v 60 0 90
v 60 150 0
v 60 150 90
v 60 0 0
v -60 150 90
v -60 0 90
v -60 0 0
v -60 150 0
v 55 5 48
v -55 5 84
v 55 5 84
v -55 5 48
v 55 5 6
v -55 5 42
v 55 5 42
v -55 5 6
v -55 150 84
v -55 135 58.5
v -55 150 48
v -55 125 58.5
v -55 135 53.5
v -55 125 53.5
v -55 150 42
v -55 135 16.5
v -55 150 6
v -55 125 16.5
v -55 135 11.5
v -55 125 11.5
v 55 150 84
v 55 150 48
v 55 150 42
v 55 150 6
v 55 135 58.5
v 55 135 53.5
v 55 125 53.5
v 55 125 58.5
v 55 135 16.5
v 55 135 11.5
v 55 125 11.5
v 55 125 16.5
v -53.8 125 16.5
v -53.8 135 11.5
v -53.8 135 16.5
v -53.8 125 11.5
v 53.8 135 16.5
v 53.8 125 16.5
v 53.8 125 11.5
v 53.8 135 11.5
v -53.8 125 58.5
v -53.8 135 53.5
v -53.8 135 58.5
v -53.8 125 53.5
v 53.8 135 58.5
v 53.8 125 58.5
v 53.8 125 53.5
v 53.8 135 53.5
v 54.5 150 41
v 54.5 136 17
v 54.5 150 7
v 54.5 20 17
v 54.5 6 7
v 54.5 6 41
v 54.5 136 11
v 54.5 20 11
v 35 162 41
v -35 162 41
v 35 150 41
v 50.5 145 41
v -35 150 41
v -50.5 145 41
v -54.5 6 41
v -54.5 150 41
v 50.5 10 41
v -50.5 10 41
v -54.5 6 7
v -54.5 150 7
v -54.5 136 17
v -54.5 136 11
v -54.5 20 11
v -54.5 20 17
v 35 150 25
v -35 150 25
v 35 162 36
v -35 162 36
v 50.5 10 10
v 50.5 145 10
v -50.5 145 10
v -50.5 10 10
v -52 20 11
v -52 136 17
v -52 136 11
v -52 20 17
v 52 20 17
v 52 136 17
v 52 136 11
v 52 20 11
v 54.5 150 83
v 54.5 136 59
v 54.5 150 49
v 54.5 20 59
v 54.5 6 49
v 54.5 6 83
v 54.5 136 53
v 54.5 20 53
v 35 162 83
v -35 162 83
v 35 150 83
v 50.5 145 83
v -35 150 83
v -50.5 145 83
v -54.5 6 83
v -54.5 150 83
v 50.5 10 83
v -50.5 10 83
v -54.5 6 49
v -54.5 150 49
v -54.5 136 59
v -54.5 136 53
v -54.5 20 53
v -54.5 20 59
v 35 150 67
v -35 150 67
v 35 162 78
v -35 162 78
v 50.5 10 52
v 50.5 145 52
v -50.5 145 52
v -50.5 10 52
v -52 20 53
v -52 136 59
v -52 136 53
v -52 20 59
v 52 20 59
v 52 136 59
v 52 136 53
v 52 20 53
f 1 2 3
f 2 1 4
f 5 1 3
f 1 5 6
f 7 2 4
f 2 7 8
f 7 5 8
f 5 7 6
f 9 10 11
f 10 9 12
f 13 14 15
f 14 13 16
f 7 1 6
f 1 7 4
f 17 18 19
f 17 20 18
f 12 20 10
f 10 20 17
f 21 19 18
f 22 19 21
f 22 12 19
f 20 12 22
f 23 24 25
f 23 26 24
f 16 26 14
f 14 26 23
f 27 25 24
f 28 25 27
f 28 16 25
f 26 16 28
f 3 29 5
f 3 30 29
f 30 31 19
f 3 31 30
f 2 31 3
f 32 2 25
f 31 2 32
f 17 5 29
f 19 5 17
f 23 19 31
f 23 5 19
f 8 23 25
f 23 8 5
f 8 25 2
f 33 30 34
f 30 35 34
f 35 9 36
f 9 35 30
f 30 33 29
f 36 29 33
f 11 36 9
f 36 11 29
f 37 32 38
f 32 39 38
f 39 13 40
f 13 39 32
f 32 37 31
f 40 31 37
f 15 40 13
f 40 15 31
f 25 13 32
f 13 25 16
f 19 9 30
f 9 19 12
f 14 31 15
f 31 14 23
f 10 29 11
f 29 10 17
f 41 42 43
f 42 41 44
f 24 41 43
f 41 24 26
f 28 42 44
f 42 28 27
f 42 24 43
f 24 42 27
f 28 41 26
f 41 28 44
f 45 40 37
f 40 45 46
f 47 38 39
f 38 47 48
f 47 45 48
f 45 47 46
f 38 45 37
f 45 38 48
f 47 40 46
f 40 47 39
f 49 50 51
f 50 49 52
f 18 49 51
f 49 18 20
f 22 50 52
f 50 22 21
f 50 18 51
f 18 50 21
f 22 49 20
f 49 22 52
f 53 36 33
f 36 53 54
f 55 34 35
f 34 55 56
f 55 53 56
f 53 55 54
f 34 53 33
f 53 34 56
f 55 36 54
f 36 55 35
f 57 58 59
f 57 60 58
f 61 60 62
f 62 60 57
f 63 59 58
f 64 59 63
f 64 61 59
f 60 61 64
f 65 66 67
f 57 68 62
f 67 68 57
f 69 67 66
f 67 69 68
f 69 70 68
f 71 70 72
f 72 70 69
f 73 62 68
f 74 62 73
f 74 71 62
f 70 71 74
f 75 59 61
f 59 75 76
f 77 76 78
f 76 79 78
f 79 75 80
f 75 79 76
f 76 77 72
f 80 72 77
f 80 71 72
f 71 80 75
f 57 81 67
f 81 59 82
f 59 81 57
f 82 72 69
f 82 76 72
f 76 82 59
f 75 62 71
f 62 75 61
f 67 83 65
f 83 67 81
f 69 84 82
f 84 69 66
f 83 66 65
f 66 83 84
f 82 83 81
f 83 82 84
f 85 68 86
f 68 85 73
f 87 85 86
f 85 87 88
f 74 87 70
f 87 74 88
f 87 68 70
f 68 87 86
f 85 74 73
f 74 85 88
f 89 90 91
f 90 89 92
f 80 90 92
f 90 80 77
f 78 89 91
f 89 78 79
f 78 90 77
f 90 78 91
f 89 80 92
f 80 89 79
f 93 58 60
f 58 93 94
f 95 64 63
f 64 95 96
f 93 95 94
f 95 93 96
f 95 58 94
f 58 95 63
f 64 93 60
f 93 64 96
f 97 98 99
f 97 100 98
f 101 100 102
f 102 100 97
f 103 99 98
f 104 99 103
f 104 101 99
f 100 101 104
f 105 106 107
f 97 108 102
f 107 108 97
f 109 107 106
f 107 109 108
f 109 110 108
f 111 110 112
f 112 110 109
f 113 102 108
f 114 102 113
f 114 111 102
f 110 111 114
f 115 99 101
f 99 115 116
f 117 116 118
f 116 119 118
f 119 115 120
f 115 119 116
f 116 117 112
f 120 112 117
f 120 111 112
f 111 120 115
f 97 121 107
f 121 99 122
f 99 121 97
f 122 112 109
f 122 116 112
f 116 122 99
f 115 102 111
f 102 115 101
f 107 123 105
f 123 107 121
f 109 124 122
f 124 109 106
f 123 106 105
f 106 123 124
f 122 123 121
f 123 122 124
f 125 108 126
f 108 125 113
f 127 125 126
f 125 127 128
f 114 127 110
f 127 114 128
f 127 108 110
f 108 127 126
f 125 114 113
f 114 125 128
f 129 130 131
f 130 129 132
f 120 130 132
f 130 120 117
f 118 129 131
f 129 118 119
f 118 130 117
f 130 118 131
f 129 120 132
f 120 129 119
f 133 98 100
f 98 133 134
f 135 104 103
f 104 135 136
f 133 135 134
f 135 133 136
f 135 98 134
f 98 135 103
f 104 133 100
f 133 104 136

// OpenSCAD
part = "assembly"; // [assembly:Assembly, frame:Frame, drawer:Drawer]
cadverify_only = "";
module instance(name, part, unit = 1) {
    echo(cadverify_instance = [name, part, unit]);
    if (cadverify_only == "" || cadverify_only == name) children();
}
// frame assembly coords: X -60..60, Y 0..150, Z 0..90
module frame_asm() {
    union() {
        translate([-60,0,0]) cube([120,5,90]);
        translate([-60,0,0]) cube([5,150,90]);
        translate([55,0,0]) cube([5,150,90]);
        translate([-55,5,0]) cube([110,145,6]);
        translate([-55,5,42]) cube([110,145,6]);
        translate([-55,5,84]) cube([110,145,6]);
        translate([-55,125,11.5]) cube([1.2,10,5]);
        translate([53.8,125,11.5]) cube([1.2,10,5]);
        translate([-55,125,53.5]) cube([1.2,10,5]);
        translate([53.8,125,53.5]) cube([1.2,10,5]);
    }
}
module frame_print() {
    translate([0,90,0]) rotate([90,0,0]) frame_asm();
}
// drawer part coords: X -54.5..54.5, Y 0..144 body + handle to 156, Z 0..34
module drawer_raw() {
    difference() {
        union() {
            translate([-54.5,0,0]) cube([109,144,34]);
            // handle wedge (solid triangular prism via hull) + tip block, overlapped for manifold union
            hull() {
                translate([-35,143,18]) cube([70,1,1]);
                translate([-35,143,29]) cube([70,1,1]);
                translate([-35,155,29]) cube([70,1,1]);
            }
            translate([-35,143,29]) cube([70,13,5]);
        }
        translate([-50.5,4,3]) cube([101,135,32]);
        translate([-54.5,14,4]) cube([2.5,116,6]);
        translate([52,14,4]) cube([2.5,116,6]);
    }
}
module drawer_part() { drawer_raw(); }
module frame_spec() {
    echo(cadverify_spec = [
        ["bounds", [[-60,0,0],[60,90,150]]],
        ["bodies", 1],
        ["through_holes", 0],
        ["support_faces", [["bed","-z",5000]]],
        ["overhangs_allowed", [
            ["stop tab underside, bridge 2.4mm", [[-55,74.5,124],[-53.8,79.5,126]]],
            ["stop tab underside, bridge 2.4mm", [[53.8,74.5,124],[55,79.5,126]]],
            ["stop tab underside, bridge 2.4mm", [[-55,32.5,124],[-53.8,37.5,126]]],
            ["stop tab underside, bridge 2.4mm", [[53.8,32.5,124],[55,37.5,126]]]
        ]],
        ["copies", 1],
        ["details", [
            ["back_panel","material",[[-60,0,0],[60,90,5]],0.9],
            ["stop_tab_ll","material",[[-55,74.5,125],[-53.8,79.5,135]],0.9],
            ["stop_tab_lr","material",[[53.8,74.5,125],[55,79.5,135]],0.9],
            ["stop_tab_ul","material",[[-55,32.5,125],[-53.8,37.5,135]],0.9],
            ["stop_tab_ur","material",[[53.8,32.5,125],[55,37.5,135]],0.9],
            ["lower_cavity","void",[[-55,48,5],[55,84,150]],0.9],
            ["upper_cavity","void",[[-55,6,5],[55,42,150]],0.9],
            ["back","thickness",[0,10,-1],[0,0,1],5]
        ]]
    ]);
}
module drawer_spec() {
    echo(cadverify_spec = [
        ["bounds", [[-54.5,0,0],[54.5,156,34]]],
        ["bodies", 1],
        ["through_holes", 0],
        ["support_faces", [["bed","-z",10000]]],
        ["overhangs_allowed", [
            ["drawer slide groove ceiling, bridge 5mm", [[-54.5,14,9],[-52,130,11]]],
            ["drawer slide groove ceiling, bridge 5mm", [[52,14,9],[54.5,130,11]]]
        ]],
        ["copies", 2],
        ["details", [
            ["pull_tip","material",[[-35,150,30],[35,156,34]],0.9],
            ["groove_left","void",[[-54.5,14,4],[-52,130,10]],0.9],
            ["groove_right","void",[[52,14,4],[54.5,130,10]],0.9],
            ["drawer_cavity","void",[[-50.5,4,3],[50.5,139,34]],0.9],
            ["bottom","thickness",[0,70,-1],[0,0,1],3],
            ["side_walls","thickness",[-55.5,70,20],[1,0,0],8],
            ["pull_shape","view",[[-35,144,18],[35,156,34]]]
        ]]
    ]);
}
module assembly_spec() {
    echo(cadverify_spec = [
        ["bounds", [[-60,0,0],[60,162,90]]],
        ["support_faces", [["base","-z",5000]]],
        ["allowed_interferences", []],
        ["motions", [
            ["drawer_lower_slide", ["drawer_lower"], "slide", [0,1,0], [0,105], ["stops", [0,105]]],
            ["drawer_upper_slide", ["drawer_upper"], "slide", [0,1,0], [0,105], ["stops", [0,105]]]
        ]],
        ["assembly_order", [
            [["frame"], [0,0,0]],
            [["drawer_lower"], [0,-1,0], ["flex", [["drawer_lower","frame",0.7,"stop tabs snap into grooves"]]]],
            [["drawer_upper"], [0,-1,0], ["flex", [["drawer_upper","frame",0.7,"stop tabs snap into grooves"]]]]
        ]]
    ]);
}
if (part == "frame") { frame_spec(); frame_print(); }
else if (part == "drawer") { drawer_spec(); drawer_part(); }
else if (part == "assembly") {
    assembly_spec();
    instance("frame","frame",1) frame_asm();
    instance("drawer_lower","drawer",1) translate([0,6,7]) drawer_raw();
    instance("drawer_upper","drawer",1) translate([0,6,49]) drawer_raw();
}
